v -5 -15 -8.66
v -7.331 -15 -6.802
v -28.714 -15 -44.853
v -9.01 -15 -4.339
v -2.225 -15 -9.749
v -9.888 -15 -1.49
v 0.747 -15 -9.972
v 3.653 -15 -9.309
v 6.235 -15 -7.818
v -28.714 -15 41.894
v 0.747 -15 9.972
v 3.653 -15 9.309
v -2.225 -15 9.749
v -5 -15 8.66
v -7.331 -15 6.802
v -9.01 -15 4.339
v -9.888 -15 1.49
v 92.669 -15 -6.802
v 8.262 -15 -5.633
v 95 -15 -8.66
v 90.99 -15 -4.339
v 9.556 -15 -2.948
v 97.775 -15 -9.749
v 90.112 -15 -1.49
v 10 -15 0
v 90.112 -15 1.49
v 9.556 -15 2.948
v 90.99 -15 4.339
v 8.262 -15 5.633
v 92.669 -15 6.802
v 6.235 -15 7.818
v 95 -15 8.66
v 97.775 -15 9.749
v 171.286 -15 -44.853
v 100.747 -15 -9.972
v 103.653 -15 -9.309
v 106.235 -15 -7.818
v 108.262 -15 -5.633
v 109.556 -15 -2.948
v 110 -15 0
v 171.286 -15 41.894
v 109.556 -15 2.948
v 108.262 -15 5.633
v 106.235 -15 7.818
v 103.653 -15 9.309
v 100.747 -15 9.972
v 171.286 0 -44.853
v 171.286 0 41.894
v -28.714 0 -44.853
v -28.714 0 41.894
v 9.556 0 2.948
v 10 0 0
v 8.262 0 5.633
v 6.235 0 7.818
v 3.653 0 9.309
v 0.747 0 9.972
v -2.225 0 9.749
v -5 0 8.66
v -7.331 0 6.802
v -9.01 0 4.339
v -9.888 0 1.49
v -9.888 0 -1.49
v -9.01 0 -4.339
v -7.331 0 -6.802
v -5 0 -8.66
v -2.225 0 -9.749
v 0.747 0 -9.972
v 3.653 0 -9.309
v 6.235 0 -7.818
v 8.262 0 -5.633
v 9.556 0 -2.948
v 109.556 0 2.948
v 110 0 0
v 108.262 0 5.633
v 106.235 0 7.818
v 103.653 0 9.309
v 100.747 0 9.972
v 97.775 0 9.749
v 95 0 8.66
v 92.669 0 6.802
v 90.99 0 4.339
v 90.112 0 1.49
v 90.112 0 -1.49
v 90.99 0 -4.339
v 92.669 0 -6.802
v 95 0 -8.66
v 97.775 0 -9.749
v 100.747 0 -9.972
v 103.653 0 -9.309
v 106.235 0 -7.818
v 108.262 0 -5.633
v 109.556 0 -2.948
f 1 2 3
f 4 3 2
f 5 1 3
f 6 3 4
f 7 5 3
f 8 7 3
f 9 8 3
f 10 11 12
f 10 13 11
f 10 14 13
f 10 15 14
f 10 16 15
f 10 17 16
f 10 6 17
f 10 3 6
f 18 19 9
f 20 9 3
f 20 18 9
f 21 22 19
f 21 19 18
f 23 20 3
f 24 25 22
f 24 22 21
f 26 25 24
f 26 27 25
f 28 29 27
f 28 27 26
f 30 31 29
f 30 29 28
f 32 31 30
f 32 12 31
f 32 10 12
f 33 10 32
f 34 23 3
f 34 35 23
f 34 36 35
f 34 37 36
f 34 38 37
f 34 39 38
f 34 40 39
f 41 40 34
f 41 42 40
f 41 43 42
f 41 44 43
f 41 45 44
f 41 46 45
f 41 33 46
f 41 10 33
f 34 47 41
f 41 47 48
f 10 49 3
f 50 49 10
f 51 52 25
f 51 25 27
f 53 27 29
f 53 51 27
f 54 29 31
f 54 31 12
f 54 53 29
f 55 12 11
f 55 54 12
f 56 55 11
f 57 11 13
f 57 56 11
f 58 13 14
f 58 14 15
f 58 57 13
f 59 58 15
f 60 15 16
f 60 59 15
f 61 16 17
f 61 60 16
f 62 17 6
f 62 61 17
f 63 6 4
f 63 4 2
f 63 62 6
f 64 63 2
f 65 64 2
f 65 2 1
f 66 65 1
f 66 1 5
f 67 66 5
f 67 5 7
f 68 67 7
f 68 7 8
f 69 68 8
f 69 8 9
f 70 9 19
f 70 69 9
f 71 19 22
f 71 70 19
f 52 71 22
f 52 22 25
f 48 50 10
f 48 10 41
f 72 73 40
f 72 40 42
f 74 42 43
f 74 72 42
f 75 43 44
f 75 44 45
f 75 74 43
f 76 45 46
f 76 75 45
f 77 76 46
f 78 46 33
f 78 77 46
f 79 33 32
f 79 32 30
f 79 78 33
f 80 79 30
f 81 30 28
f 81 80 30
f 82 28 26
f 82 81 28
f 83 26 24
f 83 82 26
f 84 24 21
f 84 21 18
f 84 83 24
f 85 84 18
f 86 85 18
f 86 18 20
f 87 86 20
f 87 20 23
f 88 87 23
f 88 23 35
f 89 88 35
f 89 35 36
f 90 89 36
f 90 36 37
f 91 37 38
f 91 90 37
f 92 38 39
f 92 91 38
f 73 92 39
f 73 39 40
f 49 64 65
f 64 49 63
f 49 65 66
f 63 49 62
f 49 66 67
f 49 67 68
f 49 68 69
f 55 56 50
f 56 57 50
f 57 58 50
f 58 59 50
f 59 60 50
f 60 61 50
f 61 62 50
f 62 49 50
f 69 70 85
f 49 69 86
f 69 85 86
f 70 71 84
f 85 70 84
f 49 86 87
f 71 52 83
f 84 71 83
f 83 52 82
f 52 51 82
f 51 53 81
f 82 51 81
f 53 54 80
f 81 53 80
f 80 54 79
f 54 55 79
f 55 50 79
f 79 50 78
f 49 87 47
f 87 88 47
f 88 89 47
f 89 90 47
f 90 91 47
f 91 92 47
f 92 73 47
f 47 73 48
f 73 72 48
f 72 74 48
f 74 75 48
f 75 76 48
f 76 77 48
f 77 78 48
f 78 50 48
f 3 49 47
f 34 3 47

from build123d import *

# Parameters (mm, degrees)
F0_W     = 200
F0_H     = 86.747314
F0_R     = 10
F1_DEPTH = 15


with BuildPart() as f1:
    # F0 (on Front) → F1 (new body)
    with BuildSketch(Plane.XZ):
        with Locations((71.285965, -1.479412)):
            Rectangle(F0_W, F0_H)
        Circle(F0_R, mode=Mode.SUBTRACT)
        with Locations((100, 0)):
            Circle(F0_R, mode=Mode.SUBTRACT)
    extrude(amount=F1_DEPTH)


solid = f1.part
